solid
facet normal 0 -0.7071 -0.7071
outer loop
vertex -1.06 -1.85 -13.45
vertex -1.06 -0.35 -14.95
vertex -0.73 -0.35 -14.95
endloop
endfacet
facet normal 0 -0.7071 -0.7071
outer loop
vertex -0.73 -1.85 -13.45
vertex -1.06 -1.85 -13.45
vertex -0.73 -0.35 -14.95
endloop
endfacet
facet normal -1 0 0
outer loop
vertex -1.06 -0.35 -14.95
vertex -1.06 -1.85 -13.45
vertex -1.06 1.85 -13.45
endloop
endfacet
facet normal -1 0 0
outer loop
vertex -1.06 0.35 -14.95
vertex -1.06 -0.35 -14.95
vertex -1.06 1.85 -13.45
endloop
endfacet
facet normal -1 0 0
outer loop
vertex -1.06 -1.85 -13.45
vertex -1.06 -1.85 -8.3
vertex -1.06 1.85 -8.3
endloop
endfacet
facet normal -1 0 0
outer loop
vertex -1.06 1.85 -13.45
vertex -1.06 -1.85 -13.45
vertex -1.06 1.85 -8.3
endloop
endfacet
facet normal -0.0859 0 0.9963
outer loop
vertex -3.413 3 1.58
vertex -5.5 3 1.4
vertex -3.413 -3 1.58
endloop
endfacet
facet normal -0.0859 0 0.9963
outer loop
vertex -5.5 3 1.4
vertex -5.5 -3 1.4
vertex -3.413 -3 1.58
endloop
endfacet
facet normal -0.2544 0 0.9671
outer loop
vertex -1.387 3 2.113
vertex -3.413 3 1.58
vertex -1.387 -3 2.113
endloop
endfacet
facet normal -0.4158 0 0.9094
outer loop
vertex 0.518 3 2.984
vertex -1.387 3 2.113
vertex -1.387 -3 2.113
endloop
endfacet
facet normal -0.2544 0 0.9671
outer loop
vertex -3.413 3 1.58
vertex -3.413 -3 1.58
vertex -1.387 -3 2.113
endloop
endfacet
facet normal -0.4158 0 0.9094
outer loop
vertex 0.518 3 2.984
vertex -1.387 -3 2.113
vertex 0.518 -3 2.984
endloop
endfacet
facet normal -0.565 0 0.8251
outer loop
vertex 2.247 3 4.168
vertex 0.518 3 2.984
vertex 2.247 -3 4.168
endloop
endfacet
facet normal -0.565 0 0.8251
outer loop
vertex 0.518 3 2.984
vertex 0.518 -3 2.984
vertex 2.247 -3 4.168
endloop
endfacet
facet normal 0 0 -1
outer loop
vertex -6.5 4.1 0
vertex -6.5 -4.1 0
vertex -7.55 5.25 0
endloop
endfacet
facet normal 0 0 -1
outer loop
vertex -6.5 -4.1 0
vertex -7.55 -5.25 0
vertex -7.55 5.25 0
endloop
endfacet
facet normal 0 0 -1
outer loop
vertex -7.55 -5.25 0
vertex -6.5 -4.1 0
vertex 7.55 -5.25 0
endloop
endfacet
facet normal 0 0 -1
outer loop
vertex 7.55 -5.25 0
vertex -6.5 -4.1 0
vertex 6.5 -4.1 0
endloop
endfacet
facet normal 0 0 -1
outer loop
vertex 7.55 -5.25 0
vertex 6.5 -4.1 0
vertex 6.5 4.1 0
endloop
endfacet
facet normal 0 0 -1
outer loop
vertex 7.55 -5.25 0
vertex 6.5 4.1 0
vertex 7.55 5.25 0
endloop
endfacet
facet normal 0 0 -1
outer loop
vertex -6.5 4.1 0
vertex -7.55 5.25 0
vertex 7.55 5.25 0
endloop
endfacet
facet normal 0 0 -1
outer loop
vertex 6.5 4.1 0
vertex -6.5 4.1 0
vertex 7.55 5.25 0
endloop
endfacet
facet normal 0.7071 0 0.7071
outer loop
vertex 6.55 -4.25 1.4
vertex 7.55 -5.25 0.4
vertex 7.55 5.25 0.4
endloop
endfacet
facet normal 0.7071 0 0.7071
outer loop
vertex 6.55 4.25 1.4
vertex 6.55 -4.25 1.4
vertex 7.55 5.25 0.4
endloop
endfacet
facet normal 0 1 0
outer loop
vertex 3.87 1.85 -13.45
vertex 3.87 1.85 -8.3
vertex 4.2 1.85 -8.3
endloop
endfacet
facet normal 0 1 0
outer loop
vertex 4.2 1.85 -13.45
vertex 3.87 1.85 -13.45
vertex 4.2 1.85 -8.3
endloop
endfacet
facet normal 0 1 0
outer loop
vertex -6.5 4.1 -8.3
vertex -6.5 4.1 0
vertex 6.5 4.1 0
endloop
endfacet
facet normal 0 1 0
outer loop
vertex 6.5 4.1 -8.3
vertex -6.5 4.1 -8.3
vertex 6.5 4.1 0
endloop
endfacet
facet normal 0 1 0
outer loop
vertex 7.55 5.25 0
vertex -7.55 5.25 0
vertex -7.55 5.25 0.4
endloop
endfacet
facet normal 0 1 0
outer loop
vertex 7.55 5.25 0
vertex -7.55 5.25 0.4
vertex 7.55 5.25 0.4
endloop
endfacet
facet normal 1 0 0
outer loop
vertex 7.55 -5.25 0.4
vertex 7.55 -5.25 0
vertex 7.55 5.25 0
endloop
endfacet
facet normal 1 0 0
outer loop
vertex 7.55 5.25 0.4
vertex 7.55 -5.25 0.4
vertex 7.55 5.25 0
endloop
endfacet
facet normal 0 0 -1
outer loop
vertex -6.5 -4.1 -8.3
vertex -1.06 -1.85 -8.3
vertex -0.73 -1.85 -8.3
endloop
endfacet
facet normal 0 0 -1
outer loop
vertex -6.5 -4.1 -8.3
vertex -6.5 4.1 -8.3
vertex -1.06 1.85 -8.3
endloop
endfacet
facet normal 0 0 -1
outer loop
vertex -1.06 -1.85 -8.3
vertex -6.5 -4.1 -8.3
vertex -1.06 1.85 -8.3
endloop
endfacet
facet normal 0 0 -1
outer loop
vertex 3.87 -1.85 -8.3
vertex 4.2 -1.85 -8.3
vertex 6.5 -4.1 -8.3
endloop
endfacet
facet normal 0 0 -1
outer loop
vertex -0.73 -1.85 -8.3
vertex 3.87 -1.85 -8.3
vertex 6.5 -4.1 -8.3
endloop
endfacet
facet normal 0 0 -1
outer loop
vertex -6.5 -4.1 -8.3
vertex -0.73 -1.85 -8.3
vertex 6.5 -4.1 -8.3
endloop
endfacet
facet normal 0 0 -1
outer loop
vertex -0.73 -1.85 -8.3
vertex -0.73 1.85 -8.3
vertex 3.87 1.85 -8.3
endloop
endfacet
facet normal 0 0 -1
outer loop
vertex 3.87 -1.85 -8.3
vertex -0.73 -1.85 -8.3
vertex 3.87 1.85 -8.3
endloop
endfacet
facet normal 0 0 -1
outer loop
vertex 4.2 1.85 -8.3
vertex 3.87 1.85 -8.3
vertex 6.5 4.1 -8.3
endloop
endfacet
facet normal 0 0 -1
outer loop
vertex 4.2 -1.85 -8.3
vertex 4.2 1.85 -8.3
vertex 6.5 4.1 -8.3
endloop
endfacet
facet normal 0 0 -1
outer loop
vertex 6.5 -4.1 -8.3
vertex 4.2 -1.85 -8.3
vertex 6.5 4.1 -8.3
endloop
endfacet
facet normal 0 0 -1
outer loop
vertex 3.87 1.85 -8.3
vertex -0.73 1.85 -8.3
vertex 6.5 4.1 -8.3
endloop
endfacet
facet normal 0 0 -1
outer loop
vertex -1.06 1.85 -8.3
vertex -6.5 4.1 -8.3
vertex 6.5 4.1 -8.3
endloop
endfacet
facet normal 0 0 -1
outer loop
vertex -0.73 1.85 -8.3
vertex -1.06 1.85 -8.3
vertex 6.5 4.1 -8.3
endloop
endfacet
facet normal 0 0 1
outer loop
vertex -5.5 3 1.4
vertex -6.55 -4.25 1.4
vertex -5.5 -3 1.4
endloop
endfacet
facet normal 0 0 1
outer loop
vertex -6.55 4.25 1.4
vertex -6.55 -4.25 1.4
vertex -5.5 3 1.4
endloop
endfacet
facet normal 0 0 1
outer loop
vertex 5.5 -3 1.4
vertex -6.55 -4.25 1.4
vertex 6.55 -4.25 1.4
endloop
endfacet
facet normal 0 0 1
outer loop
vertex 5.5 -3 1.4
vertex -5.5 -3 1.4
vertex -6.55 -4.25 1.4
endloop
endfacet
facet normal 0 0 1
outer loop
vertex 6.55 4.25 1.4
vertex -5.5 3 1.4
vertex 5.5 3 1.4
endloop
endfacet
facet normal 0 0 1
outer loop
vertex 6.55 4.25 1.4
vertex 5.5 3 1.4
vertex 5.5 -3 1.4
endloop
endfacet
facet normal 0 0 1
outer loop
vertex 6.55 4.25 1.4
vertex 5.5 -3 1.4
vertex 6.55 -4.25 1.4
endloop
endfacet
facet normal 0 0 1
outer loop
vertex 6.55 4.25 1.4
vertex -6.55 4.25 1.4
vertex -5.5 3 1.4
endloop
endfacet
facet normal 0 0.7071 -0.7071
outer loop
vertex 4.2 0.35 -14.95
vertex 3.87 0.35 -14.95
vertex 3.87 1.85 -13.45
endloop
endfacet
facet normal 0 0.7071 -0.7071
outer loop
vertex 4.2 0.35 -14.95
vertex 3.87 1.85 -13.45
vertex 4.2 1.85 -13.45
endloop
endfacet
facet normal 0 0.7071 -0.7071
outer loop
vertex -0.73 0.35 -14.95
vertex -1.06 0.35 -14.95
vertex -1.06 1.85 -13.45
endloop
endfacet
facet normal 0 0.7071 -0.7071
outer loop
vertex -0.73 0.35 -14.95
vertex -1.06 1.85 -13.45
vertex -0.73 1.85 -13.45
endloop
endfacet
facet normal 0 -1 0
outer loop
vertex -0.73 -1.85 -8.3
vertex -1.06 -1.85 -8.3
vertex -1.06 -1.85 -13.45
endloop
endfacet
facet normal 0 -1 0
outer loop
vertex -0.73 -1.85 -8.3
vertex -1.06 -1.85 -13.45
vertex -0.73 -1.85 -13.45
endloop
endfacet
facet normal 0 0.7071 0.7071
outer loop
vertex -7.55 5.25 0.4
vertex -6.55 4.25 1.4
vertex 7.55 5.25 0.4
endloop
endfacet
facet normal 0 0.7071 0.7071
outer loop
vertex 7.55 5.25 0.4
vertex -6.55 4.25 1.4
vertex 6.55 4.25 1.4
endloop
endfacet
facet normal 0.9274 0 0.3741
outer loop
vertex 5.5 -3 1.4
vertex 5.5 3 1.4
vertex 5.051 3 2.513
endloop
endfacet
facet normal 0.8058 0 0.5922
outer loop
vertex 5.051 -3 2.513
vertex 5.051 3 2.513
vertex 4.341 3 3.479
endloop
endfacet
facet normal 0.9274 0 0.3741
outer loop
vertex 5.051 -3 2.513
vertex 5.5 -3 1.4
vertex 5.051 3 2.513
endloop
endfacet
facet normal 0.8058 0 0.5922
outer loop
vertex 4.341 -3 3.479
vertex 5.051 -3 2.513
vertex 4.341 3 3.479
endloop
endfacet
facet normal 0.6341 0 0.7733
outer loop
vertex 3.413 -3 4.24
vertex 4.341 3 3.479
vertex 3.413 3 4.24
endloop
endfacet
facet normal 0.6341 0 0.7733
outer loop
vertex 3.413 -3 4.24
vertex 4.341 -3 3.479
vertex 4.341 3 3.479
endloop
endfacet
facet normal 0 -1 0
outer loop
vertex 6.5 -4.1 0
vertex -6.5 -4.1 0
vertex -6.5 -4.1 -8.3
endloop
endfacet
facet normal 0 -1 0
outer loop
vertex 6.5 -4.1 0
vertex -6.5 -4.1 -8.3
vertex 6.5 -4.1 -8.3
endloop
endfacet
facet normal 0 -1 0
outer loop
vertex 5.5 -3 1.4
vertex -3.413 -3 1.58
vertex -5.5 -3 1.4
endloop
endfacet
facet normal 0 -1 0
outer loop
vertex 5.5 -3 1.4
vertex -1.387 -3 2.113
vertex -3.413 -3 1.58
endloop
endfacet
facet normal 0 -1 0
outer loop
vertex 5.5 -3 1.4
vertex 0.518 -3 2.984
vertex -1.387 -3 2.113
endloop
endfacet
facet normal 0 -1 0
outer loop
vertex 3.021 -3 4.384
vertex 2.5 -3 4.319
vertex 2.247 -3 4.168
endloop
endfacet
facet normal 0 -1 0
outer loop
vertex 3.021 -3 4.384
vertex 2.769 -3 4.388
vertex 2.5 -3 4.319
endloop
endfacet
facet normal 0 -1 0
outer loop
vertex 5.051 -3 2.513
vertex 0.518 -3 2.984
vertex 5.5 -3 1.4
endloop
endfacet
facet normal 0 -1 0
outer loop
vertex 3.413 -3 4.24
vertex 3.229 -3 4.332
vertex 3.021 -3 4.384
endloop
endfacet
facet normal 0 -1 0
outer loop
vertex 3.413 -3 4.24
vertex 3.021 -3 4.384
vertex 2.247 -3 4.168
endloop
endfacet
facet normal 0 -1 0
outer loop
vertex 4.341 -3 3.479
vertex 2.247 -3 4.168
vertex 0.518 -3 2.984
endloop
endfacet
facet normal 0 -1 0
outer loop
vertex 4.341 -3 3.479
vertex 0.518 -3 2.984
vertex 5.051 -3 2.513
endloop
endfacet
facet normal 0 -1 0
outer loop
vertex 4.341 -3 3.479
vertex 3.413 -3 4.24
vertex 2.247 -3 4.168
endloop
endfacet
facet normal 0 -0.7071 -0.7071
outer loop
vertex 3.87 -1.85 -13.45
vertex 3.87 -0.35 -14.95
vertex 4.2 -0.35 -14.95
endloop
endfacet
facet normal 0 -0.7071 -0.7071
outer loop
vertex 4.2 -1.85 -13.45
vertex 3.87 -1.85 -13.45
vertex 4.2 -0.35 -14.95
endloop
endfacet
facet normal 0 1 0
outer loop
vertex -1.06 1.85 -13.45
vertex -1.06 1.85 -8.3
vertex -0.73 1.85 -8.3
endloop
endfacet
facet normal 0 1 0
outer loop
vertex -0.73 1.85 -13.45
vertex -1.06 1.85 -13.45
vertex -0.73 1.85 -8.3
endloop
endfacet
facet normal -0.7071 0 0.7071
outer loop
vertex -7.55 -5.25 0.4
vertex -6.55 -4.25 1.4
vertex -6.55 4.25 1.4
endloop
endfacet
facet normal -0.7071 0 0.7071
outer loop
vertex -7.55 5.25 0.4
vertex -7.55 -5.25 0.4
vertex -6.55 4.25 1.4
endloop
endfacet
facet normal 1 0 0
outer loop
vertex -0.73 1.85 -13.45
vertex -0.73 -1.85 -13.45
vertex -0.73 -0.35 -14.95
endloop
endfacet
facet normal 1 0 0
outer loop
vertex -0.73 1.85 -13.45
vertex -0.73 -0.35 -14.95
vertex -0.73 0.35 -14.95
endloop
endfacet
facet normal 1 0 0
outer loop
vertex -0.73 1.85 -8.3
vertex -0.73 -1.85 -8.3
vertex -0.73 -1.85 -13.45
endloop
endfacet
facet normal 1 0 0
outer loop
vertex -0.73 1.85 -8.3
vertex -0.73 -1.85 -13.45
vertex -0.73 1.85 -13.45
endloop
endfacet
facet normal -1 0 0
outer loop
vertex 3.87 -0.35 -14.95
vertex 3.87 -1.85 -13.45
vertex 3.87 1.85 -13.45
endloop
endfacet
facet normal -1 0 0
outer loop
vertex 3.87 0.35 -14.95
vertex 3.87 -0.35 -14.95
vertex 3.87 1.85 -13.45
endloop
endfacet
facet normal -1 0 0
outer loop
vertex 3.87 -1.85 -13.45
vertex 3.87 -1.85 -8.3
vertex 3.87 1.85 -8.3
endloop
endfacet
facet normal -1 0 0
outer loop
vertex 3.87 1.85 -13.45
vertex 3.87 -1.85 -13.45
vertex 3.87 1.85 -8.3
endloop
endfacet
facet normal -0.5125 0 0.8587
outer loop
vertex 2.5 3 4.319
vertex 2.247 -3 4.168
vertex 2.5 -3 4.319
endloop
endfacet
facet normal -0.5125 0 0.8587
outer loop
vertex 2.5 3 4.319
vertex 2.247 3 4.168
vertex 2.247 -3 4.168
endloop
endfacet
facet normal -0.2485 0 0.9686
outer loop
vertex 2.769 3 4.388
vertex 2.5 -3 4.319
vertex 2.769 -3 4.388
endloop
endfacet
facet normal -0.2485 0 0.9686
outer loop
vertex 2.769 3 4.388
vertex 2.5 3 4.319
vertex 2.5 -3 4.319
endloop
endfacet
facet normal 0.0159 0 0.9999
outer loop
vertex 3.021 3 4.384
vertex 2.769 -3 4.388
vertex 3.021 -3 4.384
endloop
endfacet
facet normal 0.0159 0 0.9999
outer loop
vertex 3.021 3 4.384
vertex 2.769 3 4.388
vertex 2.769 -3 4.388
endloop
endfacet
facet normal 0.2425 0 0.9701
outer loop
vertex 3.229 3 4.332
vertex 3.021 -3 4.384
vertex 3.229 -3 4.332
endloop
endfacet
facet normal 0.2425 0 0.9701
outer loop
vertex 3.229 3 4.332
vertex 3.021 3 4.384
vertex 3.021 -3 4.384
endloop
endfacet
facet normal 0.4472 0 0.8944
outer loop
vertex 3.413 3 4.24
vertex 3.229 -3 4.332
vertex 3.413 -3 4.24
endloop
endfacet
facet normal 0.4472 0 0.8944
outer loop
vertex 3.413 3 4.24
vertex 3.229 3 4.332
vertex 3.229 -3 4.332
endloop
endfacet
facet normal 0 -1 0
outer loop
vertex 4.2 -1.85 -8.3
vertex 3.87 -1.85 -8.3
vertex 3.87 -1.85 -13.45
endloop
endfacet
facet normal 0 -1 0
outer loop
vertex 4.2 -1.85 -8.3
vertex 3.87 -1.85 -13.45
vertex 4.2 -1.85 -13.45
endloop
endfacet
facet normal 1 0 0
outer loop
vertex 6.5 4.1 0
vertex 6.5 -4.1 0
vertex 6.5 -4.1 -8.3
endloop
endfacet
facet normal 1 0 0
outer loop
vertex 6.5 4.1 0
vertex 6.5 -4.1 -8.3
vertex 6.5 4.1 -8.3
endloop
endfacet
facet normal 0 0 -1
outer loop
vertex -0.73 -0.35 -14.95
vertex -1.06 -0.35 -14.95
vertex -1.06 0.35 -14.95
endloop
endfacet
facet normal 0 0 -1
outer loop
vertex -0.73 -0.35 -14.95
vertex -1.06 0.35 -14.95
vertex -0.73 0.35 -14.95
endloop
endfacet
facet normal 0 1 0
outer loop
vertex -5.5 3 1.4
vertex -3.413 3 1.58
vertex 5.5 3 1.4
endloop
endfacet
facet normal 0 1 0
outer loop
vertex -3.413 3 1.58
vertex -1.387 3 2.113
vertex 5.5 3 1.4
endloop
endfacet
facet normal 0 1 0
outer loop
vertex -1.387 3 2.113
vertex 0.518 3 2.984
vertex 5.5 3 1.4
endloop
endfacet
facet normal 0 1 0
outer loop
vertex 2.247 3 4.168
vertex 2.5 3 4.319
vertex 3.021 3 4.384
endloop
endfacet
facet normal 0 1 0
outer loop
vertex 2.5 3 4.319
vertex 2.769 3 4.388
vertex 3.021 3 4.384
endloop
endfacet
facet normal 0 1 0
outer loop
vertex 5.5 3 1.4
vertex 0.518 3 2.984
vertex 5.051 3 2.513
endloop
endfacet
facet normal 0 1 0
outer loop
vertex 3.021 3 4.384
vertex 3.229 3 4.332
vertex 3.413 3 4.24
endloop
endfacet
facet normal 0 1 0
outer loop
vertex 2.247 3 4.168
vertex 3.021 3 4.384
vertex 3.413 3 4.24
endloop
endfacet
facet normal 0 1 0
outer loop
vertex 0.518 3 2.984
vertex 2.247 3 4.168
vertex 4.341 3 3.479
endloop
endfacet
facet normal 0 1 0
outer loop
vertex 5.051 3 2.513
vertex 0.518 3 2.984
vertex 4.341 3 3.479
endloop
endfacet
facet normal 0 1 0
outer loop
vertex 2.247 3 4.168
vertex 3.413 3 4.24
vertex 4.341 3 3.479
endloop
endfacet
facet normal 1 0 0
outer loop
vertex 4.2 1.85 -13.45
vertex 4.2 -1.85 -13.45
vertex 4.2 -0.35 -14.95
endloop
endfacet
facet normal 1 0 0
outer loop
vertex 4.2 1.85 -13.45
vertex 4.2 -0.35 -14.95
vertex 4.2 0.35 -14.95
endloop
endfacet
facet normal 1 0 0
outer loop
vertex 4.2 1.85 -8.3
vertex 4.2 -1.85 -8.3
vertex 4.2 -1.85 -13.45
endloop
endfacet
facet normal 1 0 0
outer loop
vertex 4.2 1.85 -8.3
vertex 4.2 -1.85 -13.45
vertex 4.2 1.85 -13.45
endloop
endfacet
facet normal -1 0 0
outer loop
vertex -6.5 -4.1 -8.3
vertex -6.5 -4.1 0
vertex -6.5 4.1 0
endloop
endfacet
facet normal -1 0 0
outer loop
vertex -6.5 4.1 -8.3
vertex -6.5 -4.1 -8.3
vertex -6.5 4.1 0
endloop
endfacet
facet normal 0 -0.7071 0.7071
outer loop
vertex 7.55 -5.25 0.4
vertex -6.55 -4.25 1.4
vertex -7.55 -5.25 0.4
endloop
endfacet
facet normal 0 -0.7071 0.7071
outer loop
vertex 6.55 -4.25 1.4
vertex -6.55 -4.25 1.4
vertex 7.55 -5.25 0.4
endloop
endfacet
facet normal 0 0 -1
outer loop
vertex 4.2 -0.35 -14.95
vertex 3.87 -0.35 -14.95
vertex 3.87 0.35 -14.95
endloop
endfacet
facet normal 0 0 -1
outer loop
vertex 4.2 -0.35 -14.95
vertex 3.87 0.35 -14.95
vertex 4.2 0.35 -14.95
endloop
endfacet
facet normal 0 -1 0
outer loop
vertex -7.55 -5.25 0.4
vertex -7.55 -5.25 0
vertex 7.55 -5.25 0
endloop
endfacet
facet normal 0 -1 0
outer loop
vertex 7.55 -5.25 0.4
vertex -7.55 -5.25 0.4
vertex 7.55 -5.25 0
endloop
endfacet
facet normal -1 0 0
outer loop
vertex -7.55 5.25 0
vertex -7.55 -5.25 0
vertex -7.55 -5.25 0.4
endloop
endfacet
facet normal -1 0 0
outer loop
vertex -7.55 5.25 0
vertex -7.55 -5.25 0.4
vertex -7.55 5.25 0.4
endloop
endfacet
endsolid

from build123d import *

# Parameters (mm, degrees)
SKETCH_W        = 13
SKETCH_H        = 8.2
PAD_DEPTH       = 8.3
SKETCH001_W     = 15.1
SKETCH001_H     = 10.5
PAD001_DEPTH    = 1.4
CHAMFER_SIZE    = 1
PAD002_DEPTH    = 3
FILLET_R        = 1
SKETCH003_W     = 0.33
SKETCH003_H     = 3.7
PAD003_DEPTH    = 6.65
CHAMFER001_SIZE = 1.5


with BuildPart() as part:
    # Sketch → Pad (new body)
    with BuildSketch(Plane.XY):
        Rectangle(SKETCH_W, SKETCH_H)
    extrude(amount=-PAD_DEPTH)

    # Sketch001 → Pad001 (join)
    with BuildSketch(Plane.XY):
        Rectangle(SKETCH001_W, SKETCH001_H)
    extrude(amount=PAD001_DEPTH)

    # Chamfer
    chamfer_edges = [part.edges().sort_by_distance(p)[0] for p in [
        (-7.55, 0, 1.4),
        (0, 5.25, 1.4),
        (7.55, 0, 1.4),
        (0, -5.25, 1.4),
    ]]
    chamfer(chamfer_edges, length=CHAMFER_SIZE)

    # Sketch002 → Pad002 (join, symmetric)
    with BuildSketch(Plane.XZ):
        with BuildLine():
            Line((-5.5, 1.4), (5.5, 1.4))
            ThreePointArc((5.5, 1.4), (4.48879, 3.316002), (2.739315, 4.593869))
            ThreePointArc((-5.5, 1.4), (-1.081654, 2.2264), (2.739315, 4.593869))
        make_face()
    extrude(amount=PAD002_DEPTH, both=True)

    # Fillet
    fillet_edges = [part.edges().sort_by_distance(p)[0] for p in [
        (2.739315, 0, 4.593869),
    ]]
    fillet(fillet_edges, radius=FILLET_R)

    # Sketch003 (on DatumPlane) → Pad003 (join)
    with BuildSketch(Plane.XY.offset(-8.3)):
        with Locations((4.035, 0)):
            Rectangle(SKETCH003_W, SKETCH003_H)
        with Locations((-0.895, 0)):
            Rectangle(SKETCH003_W, SKETCH003_H)
    extrude(amount=-PAD003_DEPTH)

    # Chamfer001
    chamfer001_edges = [part.edges().sort_by_distance(p)[0] for p in [
        (4.035, 1.85, -14.95),
        (4.035, -1.85, -14.95),
        (-0.895, 1.85, -14.95),
        (-0.895, -1.85, -14.95),
    ]]
    chamfer(chamfer001_edges, length=CHAMFER001_SIZE)


solid = part.part
